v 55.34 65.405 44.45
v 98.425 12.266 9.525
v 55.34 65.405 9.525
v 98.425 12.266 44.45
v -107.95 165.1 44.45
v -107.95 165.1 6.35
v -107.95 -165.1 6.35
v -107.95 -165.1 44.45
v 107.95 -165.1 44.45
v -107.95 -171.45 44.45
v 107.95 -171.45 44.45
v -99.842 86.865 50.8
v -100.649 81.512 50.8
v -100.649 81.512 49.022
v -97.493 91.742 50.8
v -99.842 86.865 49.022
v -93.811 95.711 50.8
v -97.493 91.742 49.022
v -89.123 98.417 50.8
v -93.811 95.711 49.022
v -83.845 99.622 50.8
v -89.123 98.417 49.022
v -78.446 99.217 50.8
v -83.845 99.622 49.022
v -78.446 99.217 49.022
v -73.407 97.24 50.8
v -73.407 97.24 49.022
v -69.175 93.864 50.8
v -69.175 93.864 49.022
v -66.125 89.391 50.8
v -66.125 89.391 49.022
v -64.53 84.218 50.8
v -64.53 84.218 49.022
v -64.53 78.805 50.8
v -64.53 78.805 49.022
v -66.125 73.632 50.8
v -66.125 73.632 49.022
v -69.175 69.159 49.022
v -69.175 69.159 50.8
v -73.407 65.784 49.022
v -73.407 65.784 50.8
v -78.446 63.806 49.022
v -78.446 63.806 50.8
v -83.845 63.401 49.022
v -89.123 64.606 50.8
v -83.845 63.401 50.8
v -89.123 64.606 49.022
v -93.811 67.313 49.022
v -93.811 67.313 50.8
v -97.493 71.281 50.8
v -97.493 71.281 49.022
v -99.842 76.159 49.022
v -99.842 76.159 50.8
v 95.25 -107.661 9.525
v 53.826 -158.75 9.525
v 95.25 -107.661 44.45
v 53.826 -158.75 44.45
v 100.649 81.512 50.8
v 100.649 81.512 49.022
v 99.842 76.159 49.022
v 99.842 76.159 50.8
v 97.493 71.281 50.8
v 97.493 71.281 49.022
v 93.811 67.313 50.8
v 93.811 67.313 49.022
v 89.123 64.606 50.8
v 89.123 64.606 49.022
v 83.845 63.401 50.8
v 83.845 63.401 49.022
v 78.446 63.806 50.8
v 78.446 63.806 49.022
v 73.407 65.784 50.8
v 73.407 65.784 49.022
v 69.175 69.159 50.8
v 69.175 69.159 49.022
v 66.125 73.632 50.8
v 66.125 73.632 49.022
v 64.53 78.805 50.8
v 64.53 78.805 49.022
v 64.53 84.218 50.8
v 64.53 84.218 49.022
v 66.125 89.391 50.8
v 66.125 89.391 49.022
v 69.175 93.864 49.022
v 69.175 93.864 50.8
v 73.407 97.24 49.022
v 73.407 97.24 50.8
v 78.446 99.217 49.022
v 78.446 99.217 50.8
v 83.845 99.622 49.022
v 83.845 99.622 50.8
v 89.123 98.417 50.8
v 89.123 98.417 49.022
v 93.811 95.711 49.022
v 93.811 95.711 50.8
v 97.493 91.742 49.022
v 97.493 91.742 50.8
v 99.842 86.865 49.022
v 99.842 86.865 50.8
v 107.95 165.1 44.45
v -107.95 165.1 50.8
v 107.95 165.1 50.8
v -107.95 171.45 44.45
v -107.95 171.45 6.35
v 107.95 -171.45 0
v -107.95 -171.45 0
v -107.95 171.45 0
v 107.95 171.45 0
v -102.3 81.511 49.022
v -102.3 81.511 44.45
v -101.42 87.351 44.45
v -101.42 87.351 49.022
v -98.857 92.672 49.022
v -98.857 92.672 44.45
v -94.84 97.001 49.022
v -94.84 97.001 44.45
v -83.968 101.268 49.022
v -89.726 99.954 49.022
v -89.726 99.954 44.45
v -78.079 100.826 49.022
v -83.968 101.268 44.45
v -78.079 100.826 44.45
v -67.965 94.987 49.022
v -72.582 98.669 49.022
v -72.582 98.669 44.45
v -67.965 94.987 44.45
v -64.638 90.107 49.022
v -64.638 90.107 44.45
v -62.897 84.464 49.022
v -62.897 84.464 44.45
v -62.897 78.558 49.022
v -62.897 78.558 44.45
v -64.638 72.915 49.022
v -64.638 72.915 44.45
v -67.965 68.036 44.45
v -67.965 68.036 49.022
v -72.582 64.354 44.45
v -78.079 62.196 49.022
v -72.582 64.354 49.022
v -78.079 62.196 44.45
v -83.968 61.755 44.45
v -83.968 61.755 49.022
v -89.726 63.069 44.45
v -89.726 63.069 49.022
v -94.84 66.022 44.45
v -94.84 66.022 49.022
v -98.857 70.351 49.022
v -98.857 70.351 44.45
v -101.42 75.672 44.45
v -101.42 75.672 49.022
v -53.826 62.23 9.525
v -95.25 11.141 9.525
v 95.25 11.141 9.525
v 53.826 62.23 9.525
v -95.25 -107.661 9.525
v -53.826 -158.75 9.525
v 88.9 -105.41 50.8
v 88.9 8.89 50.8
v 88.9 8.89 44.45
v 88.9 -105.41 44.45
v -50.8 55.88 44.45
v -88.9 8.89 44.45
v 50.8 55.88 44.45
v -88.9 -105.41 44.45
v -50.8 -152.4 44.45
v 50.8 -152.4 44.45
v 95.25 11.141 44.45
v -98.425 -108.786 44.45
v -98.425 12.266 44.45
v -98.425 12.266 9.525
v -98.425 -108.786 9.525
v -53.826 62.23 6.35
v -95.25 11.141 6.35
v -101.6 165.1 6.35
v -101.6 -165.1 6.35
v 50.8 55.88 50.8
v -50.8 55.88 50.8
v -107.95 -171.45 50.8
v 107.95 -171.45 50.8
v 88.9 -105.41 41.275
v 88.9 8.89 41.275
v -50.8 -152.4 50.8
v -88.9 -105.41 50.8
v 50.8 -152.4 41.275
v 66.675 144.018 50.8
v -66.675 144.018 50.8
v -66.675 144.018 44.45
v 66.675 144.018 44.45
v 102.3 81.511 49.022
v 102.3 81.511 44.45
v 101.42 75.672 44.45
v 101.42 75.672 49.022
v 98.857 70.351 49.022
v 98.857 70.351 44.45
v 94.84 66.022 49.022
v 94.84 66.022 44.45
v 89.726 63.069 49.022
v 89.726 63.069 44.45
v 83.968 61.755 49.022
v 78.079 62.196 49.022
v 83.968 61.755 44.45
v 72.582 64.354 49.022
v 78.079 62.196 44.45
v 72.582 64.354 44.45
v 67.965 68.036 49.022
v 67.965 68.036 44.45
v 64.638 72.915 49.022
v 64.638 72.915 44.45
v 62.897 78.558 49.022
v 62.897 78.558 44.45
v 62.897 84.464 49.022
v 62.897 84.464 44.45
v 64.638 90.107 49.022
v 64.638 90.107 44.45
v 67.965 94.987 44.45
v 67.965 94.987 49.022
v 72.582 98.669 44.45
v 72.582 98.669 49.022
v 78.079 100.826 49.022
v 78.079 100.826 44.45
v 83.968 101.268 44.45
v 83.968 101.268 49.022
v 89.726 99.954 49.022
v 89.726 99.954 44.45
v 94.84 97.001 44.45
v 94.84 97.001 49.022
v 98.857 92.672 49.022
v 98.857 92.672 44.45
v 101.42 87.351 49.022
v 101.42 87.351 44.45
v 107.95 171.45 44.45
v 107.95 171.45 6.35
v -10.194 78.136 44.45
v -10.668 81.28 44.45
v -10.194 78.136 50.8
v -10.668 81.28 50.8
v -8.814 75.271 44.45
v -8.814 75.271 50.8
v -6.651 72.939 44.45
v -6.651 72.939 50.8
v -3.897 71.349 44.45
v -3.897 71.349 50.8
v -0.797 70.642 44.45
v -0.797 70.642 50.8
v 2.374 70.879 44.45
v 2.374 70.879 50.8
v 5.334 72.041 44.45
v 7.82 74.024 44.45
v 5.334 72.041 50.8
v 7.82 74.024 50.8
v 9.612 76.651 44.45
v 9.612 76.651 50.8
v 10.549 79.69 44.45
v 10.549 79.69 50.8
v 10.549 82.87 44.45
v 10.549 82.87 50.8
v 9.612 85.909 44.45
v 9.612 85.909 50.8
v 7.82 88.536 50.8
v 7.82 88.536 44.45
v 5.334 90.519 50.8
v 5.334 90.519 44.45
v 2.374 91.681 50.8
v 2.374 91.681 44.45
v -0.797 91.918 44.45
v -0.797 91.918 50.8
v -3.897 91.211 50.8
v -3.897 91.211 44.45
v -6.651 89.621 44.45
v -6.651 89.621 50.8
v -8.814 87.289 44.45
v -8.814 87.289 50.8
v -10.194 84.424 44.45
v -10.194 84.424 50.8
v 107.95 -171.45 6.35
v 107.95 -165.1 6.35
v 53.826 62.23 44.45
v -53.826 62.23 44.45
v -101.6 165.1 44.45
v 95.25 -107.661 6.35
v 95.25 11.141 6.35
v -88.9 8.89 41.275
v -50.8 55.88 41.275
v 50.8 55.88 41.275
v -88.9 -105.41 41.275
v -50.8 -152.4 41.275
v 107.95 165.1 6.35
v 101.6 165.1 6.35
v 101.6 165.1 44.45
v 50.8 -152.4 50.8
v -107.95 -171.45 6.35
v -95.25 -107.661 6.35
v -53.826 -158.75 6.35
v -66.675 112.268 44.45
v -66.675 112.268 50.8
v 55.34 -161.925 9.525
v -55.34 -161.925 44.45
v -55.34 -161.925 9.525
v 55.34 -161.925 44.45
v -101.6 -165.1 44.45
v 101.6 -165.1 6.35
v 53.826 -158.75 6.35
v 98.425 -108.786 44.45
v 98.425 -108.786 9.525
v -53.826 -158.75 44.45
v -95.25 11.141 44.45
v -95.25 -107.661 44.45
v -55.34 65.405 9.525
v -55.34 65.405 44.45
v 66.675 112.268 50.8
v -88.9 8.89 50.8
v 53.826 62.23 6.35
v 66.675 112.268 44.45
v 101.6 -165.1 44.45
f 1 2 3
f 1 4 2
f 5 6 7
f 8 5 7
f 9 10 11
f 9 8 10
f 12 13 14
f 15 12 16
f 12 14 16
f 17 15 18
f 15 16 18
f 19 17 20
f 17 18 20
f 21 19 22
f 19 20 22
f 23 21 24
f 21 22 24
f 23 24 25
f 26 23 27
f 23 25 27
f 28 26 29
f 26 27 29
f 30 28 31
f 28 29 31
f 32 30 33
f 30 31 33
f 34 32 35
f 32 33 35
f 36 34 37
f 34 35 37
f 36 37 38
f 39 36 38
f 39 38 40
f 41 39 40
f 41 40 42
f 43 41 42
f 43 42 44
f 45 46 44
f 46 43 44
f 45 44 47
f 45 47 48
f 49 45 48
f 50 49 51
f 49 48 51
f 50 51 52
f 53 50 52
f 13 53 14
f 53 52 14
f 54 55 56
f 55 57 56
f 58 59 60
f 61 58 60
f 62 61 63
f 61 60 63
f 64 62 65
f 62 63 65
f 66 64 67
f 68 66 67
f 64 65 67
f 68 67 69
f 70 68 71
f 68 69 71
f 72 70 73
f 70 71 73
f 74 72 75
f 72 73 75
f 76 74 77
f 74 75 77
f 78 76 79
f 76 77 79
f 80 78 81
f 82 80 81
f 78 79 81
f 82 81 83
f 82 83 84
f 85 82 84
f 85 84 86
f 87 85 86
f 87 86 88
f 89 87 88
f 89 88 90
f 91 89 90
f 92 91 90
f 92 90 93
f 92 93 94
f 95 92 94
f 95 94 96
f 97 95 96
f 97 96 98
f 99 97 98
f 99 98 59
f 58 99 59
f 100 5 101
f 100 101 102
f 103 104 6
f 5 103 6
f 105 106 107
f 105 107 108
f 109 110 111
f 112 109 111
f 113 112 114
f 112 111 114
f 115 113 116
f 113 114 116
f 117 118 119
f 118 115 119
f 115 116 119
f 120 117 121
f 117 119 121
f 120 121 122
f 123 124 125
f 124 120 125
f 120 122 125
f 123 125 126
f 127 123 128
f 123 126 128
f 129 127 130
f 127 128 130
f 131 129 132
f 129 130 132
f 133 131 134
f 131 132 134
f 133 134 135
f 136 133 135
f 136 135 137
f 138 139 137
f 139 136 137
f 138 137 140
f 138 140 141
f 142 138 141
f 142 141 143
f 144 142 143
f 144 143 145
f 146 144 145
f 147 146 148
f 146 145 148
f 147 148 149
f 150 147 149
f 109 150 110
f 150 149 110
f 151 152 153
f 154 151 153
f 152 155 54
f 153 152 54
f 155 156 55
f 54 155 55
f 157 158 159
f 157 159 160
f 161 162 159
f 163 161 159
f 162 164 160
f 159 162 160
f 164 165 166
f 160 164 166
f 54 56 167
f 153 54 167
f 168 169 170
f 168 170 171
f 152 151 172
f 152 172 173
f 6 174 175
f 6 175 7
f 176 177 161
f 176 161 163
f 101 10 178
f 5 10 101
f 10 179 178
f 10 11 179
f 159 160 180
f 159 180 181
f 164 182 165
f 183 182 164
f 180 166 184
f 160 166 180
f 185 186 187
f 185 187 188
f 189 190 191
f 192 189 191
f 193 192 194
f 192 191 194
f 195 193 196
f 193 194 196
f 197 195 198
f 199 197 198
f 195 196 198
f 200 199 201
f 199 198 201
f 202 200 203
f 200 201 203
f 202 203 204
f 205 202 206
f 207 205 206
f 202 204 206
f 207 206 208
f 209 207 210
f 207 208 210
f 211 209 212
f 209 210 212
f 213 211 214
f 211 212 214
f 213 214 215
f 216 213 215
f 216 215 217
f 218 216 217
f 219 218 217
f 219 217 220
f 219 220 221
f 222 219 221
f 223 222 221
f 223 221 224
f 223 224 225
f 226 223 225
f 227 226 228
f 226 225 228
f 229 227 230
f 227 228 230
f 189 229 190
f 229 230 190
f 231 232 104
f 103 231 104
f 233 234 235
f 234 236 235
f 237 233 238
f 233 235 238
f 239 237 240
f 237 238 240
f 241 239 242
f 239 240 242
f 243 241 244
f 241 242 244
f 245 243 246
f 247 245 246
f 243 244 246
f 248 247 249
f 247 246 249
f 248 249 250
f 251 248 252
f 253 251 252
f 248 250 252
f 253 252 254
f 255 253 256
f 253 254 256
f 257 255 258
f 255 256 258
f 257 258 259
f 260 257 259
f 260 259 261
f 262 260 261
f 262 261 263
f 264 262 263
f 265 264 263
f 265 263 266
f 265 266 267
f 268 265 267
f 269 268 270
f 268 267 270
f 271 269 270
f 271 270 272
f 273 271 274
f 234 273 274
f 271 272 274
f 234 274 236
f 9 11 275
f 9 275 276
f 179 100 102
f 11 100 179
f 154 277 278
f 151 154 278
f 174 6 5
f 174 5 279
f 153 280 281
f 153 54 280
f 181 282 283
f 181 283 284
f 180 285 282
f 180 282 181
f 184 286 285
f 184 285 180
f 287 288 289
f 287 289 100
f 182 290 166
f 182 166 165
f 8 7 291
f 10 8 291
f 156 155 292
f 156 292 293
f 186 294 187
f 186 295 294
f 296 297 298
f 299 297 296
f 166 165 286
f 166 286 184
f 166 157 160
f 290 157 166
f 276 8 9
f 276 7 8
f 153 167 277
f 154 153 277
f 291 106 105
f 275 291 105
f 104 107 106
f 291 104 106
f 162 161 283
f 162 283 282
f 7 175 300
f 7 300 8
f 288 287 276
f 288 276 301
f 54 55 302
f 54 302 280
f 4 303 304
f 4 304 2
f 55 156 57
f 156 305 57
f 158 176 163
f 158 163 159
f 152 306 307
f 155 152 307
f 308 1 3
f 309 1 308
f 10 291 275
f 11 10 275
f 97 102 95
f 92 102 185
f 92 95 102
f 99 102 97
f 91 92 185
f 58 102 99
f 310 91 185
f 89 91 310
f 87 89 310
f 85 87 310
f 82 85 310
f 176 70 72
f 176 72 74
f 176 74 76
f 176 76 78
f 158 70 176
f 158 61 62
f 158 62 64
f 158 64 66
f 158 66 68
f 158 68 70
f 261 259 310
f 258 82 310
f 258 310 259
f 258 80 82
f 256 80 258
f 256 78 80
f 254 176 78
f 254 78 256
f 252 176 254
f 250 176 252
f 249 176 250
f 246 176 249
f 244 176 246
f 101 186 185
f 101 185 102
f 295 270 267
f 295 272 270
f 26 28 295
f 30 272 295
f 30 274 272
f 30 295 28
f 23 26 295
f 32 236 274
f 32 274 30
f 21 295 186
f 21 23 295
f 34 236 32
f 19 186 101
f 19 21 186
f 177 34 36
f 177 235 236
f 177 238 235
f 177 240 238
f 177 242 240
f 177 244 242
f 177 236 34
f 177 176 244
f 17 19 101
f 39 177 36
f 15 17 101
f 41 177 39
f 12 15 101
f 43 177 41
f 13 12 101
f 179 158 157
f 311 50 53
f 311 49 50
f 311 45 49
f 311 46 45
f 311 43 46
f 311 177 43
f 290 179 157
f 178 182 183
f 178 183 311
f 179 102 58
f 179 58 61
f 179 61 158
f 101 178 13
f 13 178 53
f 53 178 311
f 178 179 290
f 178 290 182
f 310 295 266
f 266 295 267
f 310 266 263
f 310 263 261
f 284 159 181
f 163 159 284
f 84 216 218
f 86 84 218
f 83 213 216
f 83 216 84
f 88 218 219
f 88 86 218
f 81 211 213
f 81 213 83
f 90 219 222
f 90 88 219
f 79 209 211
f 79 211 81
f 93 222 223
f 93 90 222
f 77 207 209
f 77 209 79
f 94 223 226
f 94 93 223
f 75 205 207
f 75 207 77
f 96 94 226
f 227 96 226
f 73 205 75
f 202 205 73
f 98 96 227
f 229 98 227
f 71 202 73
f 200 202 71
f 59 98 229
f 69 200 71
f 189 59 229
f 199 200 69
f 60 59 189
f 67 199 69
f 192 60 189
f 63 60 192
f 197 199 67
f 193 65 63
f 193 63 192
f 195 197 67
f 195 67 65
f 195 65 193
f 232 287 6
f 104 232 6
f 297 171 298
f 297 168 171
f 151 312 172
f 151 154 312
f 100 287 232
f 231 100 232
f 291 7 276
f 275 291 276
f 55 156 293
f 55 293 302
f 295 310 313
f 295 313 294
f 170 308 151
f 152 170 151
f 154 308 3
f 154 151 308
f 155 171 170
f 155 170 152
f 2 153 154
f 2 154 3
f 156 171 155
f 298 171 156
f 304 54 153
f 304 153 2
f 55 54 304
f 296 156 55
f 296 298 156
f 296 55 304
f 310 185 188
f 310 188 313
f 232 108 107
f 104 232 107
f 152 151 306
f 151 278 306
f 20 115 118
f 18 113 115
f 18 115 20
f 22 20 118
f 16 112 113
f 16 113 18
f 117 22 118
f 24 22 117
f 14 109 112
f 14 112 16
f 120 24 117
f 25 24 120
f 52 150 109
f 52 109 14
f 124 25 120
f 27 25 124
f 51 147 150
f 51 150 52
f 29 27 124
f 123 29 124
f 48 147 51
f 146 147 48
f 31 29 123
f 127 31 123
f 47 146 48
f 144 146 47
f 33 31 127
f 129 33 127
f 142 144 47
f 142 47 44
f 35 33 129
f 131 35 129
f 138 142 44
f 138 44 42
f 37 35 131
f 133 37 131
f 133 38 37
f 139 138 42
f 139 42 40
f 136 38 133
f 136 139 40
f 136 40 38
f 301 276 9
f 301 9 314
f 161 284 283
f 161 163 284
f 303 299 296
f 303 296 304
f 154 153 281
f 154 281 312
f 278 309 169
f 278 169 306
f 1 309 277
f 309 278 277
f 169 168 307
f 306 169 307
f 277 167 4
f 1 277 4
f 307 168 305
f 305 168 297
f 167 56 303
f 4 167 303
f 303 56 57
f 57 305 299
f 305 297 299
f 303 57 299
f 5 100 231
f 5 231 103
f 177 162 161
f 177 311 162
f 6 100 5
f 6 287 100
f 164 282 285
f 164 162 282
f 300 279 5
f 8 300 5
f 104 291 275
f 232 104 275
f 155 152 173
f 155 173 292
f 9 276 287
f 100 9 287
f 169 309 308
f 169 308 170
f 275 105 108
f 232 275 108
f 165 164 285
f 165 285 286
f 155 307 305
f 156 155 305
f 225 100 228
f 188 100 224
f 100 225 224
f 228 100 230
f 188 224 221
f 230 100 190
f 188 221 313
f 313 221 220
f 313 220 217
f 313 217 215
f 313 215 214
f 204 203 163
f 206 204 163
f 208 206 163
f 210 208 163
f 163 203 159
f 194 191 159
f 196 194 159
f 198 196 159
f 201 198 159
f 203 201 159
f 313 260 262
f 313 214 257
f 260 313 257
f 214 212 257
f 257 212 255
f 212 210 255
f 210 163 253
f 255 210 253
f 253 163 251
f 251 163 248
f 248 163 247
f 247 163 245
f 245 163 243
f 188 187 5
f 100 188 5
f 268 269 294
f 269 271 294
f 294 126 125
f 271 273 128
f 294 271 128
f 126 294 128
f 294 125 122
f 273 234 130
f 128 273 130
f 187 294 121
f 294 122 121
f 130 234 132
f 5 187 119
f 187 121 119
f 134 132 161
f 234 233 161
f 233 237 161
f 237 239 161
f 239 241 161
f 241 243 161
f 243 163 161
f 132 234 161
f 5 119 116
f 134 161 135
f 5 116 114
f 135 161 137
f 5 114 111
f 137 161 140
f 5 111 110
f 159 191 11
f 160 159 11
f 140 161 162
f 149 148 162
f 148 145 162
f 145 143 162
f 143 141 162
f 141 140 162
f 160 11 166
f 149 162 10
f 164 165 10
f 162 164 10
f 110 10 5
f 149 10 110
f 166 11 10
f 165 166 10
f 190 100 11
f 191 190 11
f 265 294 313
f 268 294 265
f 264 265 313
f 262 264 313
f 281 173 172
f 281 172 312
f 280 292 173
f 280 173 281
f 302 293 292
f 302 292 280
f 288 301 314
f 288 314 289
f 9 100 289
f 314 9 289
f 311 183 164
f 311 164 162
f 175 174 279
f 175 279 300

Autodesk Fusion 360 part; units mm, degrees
sketch "Sketch1" plane through (0, 0, 0) normal (0, 0, 1) x (1, 0, 0) in component "Back"
  line L0 (107.95, 171.45) -> (-107.95, 171.45)
  line L1 (-107.95, 171.45) -> (-107.95, -171.45)
  line L2 (-107.95, -171.45) -> (107.95, -171.45)
  line L3 (107.95, -171.45) -> (107.95, 171.45)
  line L4 (107.95, 171.45) -> (-107.95, -171.45) construction
  line L5 (-107.95, 171.45) -> (107.95, -171.45) construction
  dimension "d1" = 215.9
  dimension "d2" = 342.9
extrude "Extrude1" add sketch "Sketch1" along normal blind 6.35 makes body 1 in component "Back"
ref_plane "WorkPlane1" through (0, 131.445, 0) normal (0, 1, 0) x (0, 0, 1) in component "Top/Bottom"
sketch "Sketch1 (2)" plane through (0, 131.445, 0) normal (0, 1, 0) x (1, 0, 0) in component "Top/Bottom"
  line L0 (-101.6, 0) -> (102.87, 0)
  line L1 (102.87, 0) -> (102.87, -50.8)
  line L2 (102.87, -50.8) -> (-101.6, -50.8)
  line L3 (-101.6, -50.8) -> (-101.6, 0)
  dimension "d36" = 204.47
  dimension "d37" = 50.8
sketch "Sketch4" plane through (0, 0, 6.35) normal (0, 0, 1) x (-1, 0, 0) in component "Top/Bottom"
  line L0 (-107.95, 171.45) -> (-107.95, -171.45)
  line L1 (-107.95, -171.45) -> (107.95, -171.45)
  line L2 (107.95, -171.45) -> (107.95, 171.45)
  line L3 (107.95, 171.45) -> (-107.95, 171.45)
  line L4 (107.95, -171.45) -> (-107.95, -171.45)
  line L5 (-107.95, -171.45) -> (-107.95, -165.1)
  line L6 (-107.95, -165.1) -> (107.95, -165.1)
  line L7 (107.95, -165.1) -> (107.95, -171.45)
  dimension "d43" = 215.9
  dimension "d44" = 6.35
extrude "Extrude2" add sketch "Sketch4" along normal blind 38.1 separate body contours L0 L1 L2 L4 L5 L6 L7 makes body 2 in component "Top/Bottom"
mirror "Mirror1" about plane through (0, 0, 0) normal (0, 1, 0) of bodies 2 makes body 3 in component "Top/Bottom"
sketch "Sketch1 (3)" plane through (0, 0, 6.35) normal (0, 0, 1) x (-1, 0, 0) in component "Left"
  line L0 (-107.95, 171.45) -> (-107.95, -171.45)
  line L1 (-107.95, -171.45) -> (107.95, -171.45)
  line L2 (107.95, -171.45) -> (107.95, 171.45)
  line L3 (107.95, 171.45) -> (-107.95, 171.45)
  line L4 (107.95, -171.45) -> (107.95, -165.1) construction
  line L5 (107.95, -165.1) -> (101.6, -165.1)
  line L6 (101.6, -165.1) -> (101.6, 165.1)
  line L7 (101.6, 165.1) -> (107.95, 165.1)
  line L8 (107.95, 165.1) -> (107.95, -165.1)
  dimension "d49" = 6.35
  dimension "d50" = 330.2
extrude "Extrude1'" add sketch "Sketch1 (3)" along normal blind 38.1 separate body contours L2 L5 L6 L7 L8 makes body 4 in component "Left"
mirror "Mirror1'" about plane through (0, 0, 0) normal (1, 0, 0) of bodies 4 makes body 5 in component "Left"
sketch "Sketch1 (4)" plane through (0, 0, 44.45) normal (0, 0, 1) x (-1, 0, 0) in component "Lid"
  line L0 (107.95, -165.1) -> (-107.95, -165.1)
  line L1 (-107.95, -165.1) -> (-107.95, -171.45)
  line L2 (-107.95, -171.45) -> (107.95, -171.45)
  line L3 (107.95, -171.45) -> (107.95, -165.1)
  line L4 (107.95, -171.45) -> (-107.95, -171.45)
  line L5 (-107.95, -171.45) -> (-107.95, 171.45)
  line L6 (-107.95, 171.45) -> (107.95, 171.45)
  line L7 (107.95, 171.45) -> (107.95, -171.45)
  dimension "d55" = 215.9
  dimension "d56" = 342.9
extrude "Extrude1''" add sketch "Sketch1 (4)" along normal blind 6.35 separate body contours L0 L5 L6 L7 makes body 6 in component "Lid"
sketch "Sketch2" plane through (0, 0, 50.8) normal (0, 0, 1) x (-1, 0, 0) in component "Lid"
  line L0 (107.95, 171.45) -> (-107.95, 171.45)
  line L1 (-107.95, 171.45) -> (-107.95, -165.1)
  line L2 (-107.95, -165.1) -> (107.95, -165.1)
  line L3 (107.95, -165.1) -> (107.95, 171.45)
  line L4 (0, 171.45) -> (0, 152.4) construction
  line L5 (0, 152.4) -> (0, -50.8) construction
  line L6 (0, -50.8) -> (0, 50.8) construction
  line L7 (0, 50.8) -> (57.15, 50.8) construction
  line L8 (0, 152.4) -> (50.8, 152.4)
  line L9 (50.8, 152.4) -> (50.8, 105.41) construction
  line L10 (50.8, 105.41) -> (88.9, 105.41) construction
  line L11 (50.8, 152.4) -> (88.9, 105.41)
  line L12 (88.9, 105.41) -> (88.9, -8.89)
  line L13 (88.9, -8.89) -> (50.8, -8.89) construction
  line L14 (50.8, -8.89) -> (50.8, -55.88) construction
  line L15 (88.9, -8.89) -> (50.8, -55.88)
  line L16 (50.8, -55.88) -> (0, -55.88)
  line L17 (0, -55.88) -> (0, 152.4)
  dimension "d59" = 19.05
  dimension "d60" = 203.2
  dimension "d61" = 101.6
  dimension "d62" = 57.15
  dimension "d63" = 50.8
  dimension "d64" = 46.99
  dimension "d65" = 38.1
  dimension "d66" = 114.3
  dimension "d67" = 38.1
  dimension "d68" = 46.99
  dimension "d69" = 50.8
extrude "Extrude2'" cut sketch "Sketch2" against normal up to surface (6.35 mm away) contours L8 L11 L12 L15 L16 L17 bodies 6 in component "Lid"
mirror "Mirror1''" about plane through (0, 0, 0) normal (1, 0, 0) of "Extrude2'" in component "Lid"
sketch "Sketch3" plane through (0, 0, 50.8) normal (0, 0, 1) x (-1, 0, 0) in component "Lid"
  line L0 (107.95, 171.45) -> (-107.95, 171.45)
  line L1 (-107.95, 171.45) -> (-107.95, -165.1)
  line L2 (-107.95, -165.1) -> (107.95, -165.1)
  line L3 (107.95, -165.1) -> (107.95, 171.45)
  line L4 (50.8, -55.88) -> (-50.8, -55.88)
  line L5 (-50.8, -55.88) -> (-88.9, -8.89)
  line L6 (-88.9, -8.89) -> (-88.9, 105.41)
  line L7 (-88.9, 105.41) -> (-50.8, 152.4)
  line L8 (-50.8, 152.4) -> (50.8, 152.4)
  line L9 (50.8, 152.4) -> (88.9, 105.41)
  line L10 (88.9, 105.41) -> (88.9, -8.89)
  line L11 (88.9, -8.89) -> (50.8, -55.88)
  circle A0 centre (0, -81.28) radius 10.668
  dimension "d74" = 21.336
  dimension "d75" = 25.4
extrude "Extrude3" cut sketch "Sketch3" against normal up to surface (6.35 mm away) contours A0 bodies 6 in component "Lid"
sketch "Sketch4 (2)" plane through (0, 0, 50.8) normal (0, 0, 1) x (-1, 0, 0) in component "Lid"
  circle A0 centre (0, -81.28) radius 10.668
  line L0 (107.95, 171.45) -> (-107.95, 171.45)
  line L1 (-107.95, 171.45) -> (-107.95, -165.1)
  line L2 (-107.95, -165.1) -> (107.95, -165.1)
  line L3 (107.95, -165.1) -> (107.95, 171.45)
  line L4 (50.8, -55.88) -> (-50.8, -55.88)
  line L5 (-50.8, -55.88) -> (-88.9, -8.89)
  line L6 (-88.9, -8.89) -> (-88.9, 105.41)
  line L7 (-88.9, 105.41) -> (-50.8, 152.4)
  line L8 (-50.8, 152.4) -> (50.8, 152.4)
  line L9 (50.8, 152.4) -> (88.9, 105.41)
  line L10 (88.9, 105.41) -> (88.9, -8.89)
  line L11 (88.9, -8.89) -> (50.8, -55.88)
  line L12 (66.675, -144.018) -> (-66.675, -144.018)
  line L13 (-66.675, -144.018) -> (-66.675, -112.268)
  line L14 (-66.675, -112.268) -> (66.675, -112.268)
  line L15 (66.675, -112.268) -> (66.675, -144.018)
  line L16 (66.675, -144.018) -> (-66.675, -112.268) construction
  line L17 (-66.675, -144.018) -> (66.675, -112.268) construction
  point P0 (0, -128.143)
  dimension "d78" = 133.35
  dimension "d79" = 31.75
  dimension "d80" = 30.988
extrude "Extrude4" cut sketch "Sketch4 (2)" against normal up to surface (6.35 mm away) contours L12 L13 L14 L15 bodies 6 in component "Lid"
sketch "Sketch5" plane through (0, 0, 44.45) normal (0, 0, -1) x (1, 0, 0) in component "Lid"
  line L0 (-66.675, -144.018) -> (-66.675, -112.268)
  line L1 (-66.675, -112.268) -> (66.675, -112.268)
  line L2 (66.675, -112.268) -> (66.675, -144.018)
  line L3 (66.675, -144.018) -> (-66.675, -144.018)
  circle A0 centre (0, -81.28) radius 10.668
  line L4 (50.8, -55.88) -> (-50.8, -55.88)
  line L5 (-50.8, -55.88) -> (-88.9, -8.89)
  line L6 (-88.9, -8.89) -> (-88.9, 105.41)
  line L7 (-88.9, 105.41) -> (-50.8, 152.4)
  line L8 (-50.8, 152.4) -> (50.8, 152.4)
  line L9 (50.8, 152.4) -> (88.9, 105.41)
  line L10 (88.9, 105.41) -> (88.9, -8.89)
  line L11 (88.9, -8.89) -> (50.8, -55.88)
  line L12 (107.95, 171.45) -> (-107.95, 171.45)
  line L13 (-107.95, 171.45) -> (-107.95, -165.1)
  line L14 (-107.95, -165.1) -> (107.95, -165.1)
  line L15 (107.95, -165.1) -> (107.95, 171.45)
  line L16 (-88.9, -8.89) -> (-50.8, -55.88)
  line L17 (-50.8, -55.88) -> (50.8, -55.88)
  line L18 (-88.9, 105.41) -> (-88.9, -8.89)
  line L19 (50.8, -55.88) -> (88.9, -8.89)
  line L20 (88.9, -8.89) -> (88.9, 105.41)
  line L21 (88.9, 105.41) -> (50.8, 152.4)
  line L22 (-50.8, 152.4) -> (-88.9, 105.41)
  line L23 (50.8, 152.4) -> (-50.8, 152.4)
  line L24 (-50.8, -55.88) -> (50.8, -55.88)
  line L25 (50.8, -55.88) -> (88.9, -8.89)
  line L26 (88.9, 105.41) -> (50.8, 152.4)
  line L27 (50.8, 152.4) -> (-50.8, 152.4)
  line L28 (-50.8, 152.4) -> (-88.9, 105.41)
  line L29 (-88.9, 105.41) -> (-88.9, -8.89)
  line L30 (-88.9, -8.89) -> (-50.8, -55.88)
sketch "Sketch1 (5)" plane through (0, 0, 44.45) normal (0, 0, -1) x (1, 0, 0) in component "Punch Box"
  line L0 (-50.8, 152.4) -> (50.8, 152.4)
  line L1 (-88.9, 105.41) -> (-50.8, 152.4)
  line L2 (-88.9, -8.89) -> (-88.9, 105.41)
  line L3 (-50.8, -55.88) -> (-88.9, -8.89)
  line L4 (50.8, -55.88) -> (-50.8, -55.88)
  line L5 (88.9, -8.89) -> (50.8, -55.88)
  line L6 (88.9, 105.41) -> (88.9, -8.89)
  line L7 (50.8, 152.4) -> (88.9, 105.41)
  line L8 (53.8264, 158.75) -> (95.25, 107.6609)
  line L9 (95.25, 107.6609) -> (95.25, -11.1409)
  line L10 (95.25, -11.1409) -> (53.8264, -62.23)
  line L11 (53.8264, -62.23) -> (-53.8264, -62.23)
  line L12 (-53.8264, -62.23) -> (-95.25, -11.1409)
  line L13 (-95.25, -11.1409) -> (-95.25, 107.6609)
  line L14 (-95.25, 107.6609) -> (-53.8264, 158.75)
  line L15 (-53.8264, 158.75) -> (53.8264, 158.75)
  line L16 (98.425, 108.7863) -> (98.425, -12.2663)
  line L17 (98.425, -12.2663) -> (55.3396, -65.405)
  line L18 (55.3396, -65.405) -> (-55.3396, -65.405)
  line L19 (-55.3396, -65.405) -> (-98.425, -12.2663)
  line L20 (-98.425, -12.2663) -> (-98.425, 108.7863)
  line L21 (-98.425, 108.7863) -> (-55.3396, 161.925)
  line L22 (-55.3396, 161.925) -> (55.3396, 161.925)
  line L23 (55.3396, 161.925) -> (98.425, 108.7863)
  dimension "d83" = -6.35
  dimension "d84" = -9.525
extrude "Extrude1'''" add sketch "Sketch1 (5)" along normal blind 34.925 separate body contours L16 L17 L18 L19 L20 L21 L22 L23 makes body 7 in component "Punch Box"
sketch "Sketch5 (2)" plane through (0, 0, 9.525) normal (0, 0, -1) x (1, 0, 0) in component "Punch Box"
  line L0 (-95.25, 107.6609) -> (-53.8264, 158.75)
  line L1 (-53.8264, 158.75) -> (53.8264, 158.75)
  line L2 (53.8264, 158.75) -> (95.25, 107.6609)
  line L3 (95.25, 107.6609) -> (95.25, -11.1409)
  line L4 (95.25, -11.1409) -> (53.8264, -62.23)
  line L5 (53.8264, -62.23) -> (-53.8264, -62.23)
  line L6 (-53.8264, -62.23) -> (-95.25, -11.1409)
  line L7 (-95.25, -11.1409) -> (-95.25, 107.6609)
  line L8 (55.3396, 161.925) -> (-55.3396, 161.925)
  line L9 (-55.3396, 161.925) -> (-98.425, 108.7863)
  line L10 (-98.425, 108.7863) -> (-98.425, -12.2663)
  line L11 (-98.425, -12.2663) -> (-55.3396, -65.405)
  line L12 (-55.3396, -65.405) -> (55.3396, -65.405)
  line L13 (55.3396, -65.405) -> (98.425, -12.2663)
  line L14 (98.425, -12.2663) -> (98.425, 108.7863)
  line L15 (98.425, 108.7863) -> (55.3396, 161.925)
  line L16 (55.3396, -65.405) -> (-55.3396, -65.405)
  line L17 (-55.3396, -65.405) -> (-98.425, -12.2663)
  line L18 (-98.425, 108.7863) -> (-98.425, -12.2663)
  line L19 (-98.425, 108.7863) -> (-55.3396, 161.925)
  line L20 (-55.3396, 161.925) -> (55.3396, 161.925)
  line L21 (98.425, 108.7863) -> (55.3396, 161.925)
  line L22 (98.425, 108.7863) -> (98.425, -12.2663)
  line L23 (98.425, -12.2663) -> (55.3396, -65.405)
extrude "Extrude2''" add sketch "Sketch5 (2)" along normal blind 3.175 separate body contours L0 L1 L2 L3 L4 L5 L6 L7 makes body 8 in component "Punch Box"
sketch "Sketch1 (6)" plane through (0, 0, 44.45) normal (0, 0, -1) x (1, 0, 0) in component "Punch Pad"
  line L0 (53.8264, -62.23) -> (-53.8264, -62.23)
  line L1 (-53.8264, -62.23) -> (-95.25, -11.1409)
  line L2 (-95.25, -11.1409) -> (-95.25, 107.6609)
  line L3 (95.25, -11.1409) -> (53.8264, -62.23)
  line L4 (95.25, 107.6609) -> (95.25, -11.1409)
  line L5 (53.8264, 158.75) -> (95.25, 107.6609)
  line L6 (-53.8264, 158.75) -> (53.8264, 158.75)
  line L7 (-95.25, 107.6609) -> (-53.8264, 158.75)
extrude "Extrude1''''" add sketch "Sketch1 (5)" along normal blind 3.175 separate body contours L0 L1 L2 L3 L4 L5 L6 L7 makes body 9 in component "Punch Pad"
sketch "Sketch8" plane through (0, 0, 44.45) normal (0, 0, -1) x (1, 0, 0) in component "Lid"
  line L0 (107.8877, -81.5117) -> (82.4877, -81.5117) construction
  circle A0 centre (82.4877, -81.5117) radius 18.161
  dimension "d91" = 25.4
  dimension "d92" = 36.322
extrude "Extrude5" cut sketch "Sketch8" against normal up to surface (6.35 mm away) bodies 6 in component "Lid"
sketch "Sketch9" plane through (0, 0, 44.45) normal (0, 0, -1) x (1, 0, 0) in component "Lid"
  circle A0 centre (82.4879, -81.5112) radius 19.812
  dimension "d95" = 39.624
extrude "Extrude6" cut sketch "Sketch9" against normal up to surface (4.572 mm away) bodies 6 in component "Lid"
mirror "Mirror2" about plane through (0, 0, 0) normal (1, 0, 0) of "Extrude6", "Extrude5" in component "Lid"
component "Back" placed x (1, 0, 0) y (0, 1, 0) z (0, 0, 1) at (0, 0, 0)
component "Top/Bottom" placed x (1, 0, 0) y (0, 1, 0) z (0, 0, 1) at (0, 0, 0)
component "Left" placed x (1, 0, 0) y (0, 1, 0) z (0, 0, 1) at (0, 0, 0)
component "Right" placed x (1, 0, 0) y (0, 1, 0) z (0, 0, 1) at (0, 0, 0)
component "Lid" placed x (1, 0, 0) y (0, 1, 0) z (0, 0, 1) at (0, 0, 0)
component "Punch Box" placed x (1, 0, 0) y (0, 1, 0) z (0, 0, 1) at (0, 0, 0)
component "Punch Pad" placed x (1, 0, 0) y (0, 1, 0) z (0, 0, 1) at (0, 0, 0)
equation "d3 = ( 1 / 4 ) * 1 in"
equation "d85 = 1.50 in - ( 1 / 8 ) * 1 in"
equation "d87 = ( 1 / 8 ) * 1 in"
equation "d89 = ( 1 / 8 ) * 1 in"
